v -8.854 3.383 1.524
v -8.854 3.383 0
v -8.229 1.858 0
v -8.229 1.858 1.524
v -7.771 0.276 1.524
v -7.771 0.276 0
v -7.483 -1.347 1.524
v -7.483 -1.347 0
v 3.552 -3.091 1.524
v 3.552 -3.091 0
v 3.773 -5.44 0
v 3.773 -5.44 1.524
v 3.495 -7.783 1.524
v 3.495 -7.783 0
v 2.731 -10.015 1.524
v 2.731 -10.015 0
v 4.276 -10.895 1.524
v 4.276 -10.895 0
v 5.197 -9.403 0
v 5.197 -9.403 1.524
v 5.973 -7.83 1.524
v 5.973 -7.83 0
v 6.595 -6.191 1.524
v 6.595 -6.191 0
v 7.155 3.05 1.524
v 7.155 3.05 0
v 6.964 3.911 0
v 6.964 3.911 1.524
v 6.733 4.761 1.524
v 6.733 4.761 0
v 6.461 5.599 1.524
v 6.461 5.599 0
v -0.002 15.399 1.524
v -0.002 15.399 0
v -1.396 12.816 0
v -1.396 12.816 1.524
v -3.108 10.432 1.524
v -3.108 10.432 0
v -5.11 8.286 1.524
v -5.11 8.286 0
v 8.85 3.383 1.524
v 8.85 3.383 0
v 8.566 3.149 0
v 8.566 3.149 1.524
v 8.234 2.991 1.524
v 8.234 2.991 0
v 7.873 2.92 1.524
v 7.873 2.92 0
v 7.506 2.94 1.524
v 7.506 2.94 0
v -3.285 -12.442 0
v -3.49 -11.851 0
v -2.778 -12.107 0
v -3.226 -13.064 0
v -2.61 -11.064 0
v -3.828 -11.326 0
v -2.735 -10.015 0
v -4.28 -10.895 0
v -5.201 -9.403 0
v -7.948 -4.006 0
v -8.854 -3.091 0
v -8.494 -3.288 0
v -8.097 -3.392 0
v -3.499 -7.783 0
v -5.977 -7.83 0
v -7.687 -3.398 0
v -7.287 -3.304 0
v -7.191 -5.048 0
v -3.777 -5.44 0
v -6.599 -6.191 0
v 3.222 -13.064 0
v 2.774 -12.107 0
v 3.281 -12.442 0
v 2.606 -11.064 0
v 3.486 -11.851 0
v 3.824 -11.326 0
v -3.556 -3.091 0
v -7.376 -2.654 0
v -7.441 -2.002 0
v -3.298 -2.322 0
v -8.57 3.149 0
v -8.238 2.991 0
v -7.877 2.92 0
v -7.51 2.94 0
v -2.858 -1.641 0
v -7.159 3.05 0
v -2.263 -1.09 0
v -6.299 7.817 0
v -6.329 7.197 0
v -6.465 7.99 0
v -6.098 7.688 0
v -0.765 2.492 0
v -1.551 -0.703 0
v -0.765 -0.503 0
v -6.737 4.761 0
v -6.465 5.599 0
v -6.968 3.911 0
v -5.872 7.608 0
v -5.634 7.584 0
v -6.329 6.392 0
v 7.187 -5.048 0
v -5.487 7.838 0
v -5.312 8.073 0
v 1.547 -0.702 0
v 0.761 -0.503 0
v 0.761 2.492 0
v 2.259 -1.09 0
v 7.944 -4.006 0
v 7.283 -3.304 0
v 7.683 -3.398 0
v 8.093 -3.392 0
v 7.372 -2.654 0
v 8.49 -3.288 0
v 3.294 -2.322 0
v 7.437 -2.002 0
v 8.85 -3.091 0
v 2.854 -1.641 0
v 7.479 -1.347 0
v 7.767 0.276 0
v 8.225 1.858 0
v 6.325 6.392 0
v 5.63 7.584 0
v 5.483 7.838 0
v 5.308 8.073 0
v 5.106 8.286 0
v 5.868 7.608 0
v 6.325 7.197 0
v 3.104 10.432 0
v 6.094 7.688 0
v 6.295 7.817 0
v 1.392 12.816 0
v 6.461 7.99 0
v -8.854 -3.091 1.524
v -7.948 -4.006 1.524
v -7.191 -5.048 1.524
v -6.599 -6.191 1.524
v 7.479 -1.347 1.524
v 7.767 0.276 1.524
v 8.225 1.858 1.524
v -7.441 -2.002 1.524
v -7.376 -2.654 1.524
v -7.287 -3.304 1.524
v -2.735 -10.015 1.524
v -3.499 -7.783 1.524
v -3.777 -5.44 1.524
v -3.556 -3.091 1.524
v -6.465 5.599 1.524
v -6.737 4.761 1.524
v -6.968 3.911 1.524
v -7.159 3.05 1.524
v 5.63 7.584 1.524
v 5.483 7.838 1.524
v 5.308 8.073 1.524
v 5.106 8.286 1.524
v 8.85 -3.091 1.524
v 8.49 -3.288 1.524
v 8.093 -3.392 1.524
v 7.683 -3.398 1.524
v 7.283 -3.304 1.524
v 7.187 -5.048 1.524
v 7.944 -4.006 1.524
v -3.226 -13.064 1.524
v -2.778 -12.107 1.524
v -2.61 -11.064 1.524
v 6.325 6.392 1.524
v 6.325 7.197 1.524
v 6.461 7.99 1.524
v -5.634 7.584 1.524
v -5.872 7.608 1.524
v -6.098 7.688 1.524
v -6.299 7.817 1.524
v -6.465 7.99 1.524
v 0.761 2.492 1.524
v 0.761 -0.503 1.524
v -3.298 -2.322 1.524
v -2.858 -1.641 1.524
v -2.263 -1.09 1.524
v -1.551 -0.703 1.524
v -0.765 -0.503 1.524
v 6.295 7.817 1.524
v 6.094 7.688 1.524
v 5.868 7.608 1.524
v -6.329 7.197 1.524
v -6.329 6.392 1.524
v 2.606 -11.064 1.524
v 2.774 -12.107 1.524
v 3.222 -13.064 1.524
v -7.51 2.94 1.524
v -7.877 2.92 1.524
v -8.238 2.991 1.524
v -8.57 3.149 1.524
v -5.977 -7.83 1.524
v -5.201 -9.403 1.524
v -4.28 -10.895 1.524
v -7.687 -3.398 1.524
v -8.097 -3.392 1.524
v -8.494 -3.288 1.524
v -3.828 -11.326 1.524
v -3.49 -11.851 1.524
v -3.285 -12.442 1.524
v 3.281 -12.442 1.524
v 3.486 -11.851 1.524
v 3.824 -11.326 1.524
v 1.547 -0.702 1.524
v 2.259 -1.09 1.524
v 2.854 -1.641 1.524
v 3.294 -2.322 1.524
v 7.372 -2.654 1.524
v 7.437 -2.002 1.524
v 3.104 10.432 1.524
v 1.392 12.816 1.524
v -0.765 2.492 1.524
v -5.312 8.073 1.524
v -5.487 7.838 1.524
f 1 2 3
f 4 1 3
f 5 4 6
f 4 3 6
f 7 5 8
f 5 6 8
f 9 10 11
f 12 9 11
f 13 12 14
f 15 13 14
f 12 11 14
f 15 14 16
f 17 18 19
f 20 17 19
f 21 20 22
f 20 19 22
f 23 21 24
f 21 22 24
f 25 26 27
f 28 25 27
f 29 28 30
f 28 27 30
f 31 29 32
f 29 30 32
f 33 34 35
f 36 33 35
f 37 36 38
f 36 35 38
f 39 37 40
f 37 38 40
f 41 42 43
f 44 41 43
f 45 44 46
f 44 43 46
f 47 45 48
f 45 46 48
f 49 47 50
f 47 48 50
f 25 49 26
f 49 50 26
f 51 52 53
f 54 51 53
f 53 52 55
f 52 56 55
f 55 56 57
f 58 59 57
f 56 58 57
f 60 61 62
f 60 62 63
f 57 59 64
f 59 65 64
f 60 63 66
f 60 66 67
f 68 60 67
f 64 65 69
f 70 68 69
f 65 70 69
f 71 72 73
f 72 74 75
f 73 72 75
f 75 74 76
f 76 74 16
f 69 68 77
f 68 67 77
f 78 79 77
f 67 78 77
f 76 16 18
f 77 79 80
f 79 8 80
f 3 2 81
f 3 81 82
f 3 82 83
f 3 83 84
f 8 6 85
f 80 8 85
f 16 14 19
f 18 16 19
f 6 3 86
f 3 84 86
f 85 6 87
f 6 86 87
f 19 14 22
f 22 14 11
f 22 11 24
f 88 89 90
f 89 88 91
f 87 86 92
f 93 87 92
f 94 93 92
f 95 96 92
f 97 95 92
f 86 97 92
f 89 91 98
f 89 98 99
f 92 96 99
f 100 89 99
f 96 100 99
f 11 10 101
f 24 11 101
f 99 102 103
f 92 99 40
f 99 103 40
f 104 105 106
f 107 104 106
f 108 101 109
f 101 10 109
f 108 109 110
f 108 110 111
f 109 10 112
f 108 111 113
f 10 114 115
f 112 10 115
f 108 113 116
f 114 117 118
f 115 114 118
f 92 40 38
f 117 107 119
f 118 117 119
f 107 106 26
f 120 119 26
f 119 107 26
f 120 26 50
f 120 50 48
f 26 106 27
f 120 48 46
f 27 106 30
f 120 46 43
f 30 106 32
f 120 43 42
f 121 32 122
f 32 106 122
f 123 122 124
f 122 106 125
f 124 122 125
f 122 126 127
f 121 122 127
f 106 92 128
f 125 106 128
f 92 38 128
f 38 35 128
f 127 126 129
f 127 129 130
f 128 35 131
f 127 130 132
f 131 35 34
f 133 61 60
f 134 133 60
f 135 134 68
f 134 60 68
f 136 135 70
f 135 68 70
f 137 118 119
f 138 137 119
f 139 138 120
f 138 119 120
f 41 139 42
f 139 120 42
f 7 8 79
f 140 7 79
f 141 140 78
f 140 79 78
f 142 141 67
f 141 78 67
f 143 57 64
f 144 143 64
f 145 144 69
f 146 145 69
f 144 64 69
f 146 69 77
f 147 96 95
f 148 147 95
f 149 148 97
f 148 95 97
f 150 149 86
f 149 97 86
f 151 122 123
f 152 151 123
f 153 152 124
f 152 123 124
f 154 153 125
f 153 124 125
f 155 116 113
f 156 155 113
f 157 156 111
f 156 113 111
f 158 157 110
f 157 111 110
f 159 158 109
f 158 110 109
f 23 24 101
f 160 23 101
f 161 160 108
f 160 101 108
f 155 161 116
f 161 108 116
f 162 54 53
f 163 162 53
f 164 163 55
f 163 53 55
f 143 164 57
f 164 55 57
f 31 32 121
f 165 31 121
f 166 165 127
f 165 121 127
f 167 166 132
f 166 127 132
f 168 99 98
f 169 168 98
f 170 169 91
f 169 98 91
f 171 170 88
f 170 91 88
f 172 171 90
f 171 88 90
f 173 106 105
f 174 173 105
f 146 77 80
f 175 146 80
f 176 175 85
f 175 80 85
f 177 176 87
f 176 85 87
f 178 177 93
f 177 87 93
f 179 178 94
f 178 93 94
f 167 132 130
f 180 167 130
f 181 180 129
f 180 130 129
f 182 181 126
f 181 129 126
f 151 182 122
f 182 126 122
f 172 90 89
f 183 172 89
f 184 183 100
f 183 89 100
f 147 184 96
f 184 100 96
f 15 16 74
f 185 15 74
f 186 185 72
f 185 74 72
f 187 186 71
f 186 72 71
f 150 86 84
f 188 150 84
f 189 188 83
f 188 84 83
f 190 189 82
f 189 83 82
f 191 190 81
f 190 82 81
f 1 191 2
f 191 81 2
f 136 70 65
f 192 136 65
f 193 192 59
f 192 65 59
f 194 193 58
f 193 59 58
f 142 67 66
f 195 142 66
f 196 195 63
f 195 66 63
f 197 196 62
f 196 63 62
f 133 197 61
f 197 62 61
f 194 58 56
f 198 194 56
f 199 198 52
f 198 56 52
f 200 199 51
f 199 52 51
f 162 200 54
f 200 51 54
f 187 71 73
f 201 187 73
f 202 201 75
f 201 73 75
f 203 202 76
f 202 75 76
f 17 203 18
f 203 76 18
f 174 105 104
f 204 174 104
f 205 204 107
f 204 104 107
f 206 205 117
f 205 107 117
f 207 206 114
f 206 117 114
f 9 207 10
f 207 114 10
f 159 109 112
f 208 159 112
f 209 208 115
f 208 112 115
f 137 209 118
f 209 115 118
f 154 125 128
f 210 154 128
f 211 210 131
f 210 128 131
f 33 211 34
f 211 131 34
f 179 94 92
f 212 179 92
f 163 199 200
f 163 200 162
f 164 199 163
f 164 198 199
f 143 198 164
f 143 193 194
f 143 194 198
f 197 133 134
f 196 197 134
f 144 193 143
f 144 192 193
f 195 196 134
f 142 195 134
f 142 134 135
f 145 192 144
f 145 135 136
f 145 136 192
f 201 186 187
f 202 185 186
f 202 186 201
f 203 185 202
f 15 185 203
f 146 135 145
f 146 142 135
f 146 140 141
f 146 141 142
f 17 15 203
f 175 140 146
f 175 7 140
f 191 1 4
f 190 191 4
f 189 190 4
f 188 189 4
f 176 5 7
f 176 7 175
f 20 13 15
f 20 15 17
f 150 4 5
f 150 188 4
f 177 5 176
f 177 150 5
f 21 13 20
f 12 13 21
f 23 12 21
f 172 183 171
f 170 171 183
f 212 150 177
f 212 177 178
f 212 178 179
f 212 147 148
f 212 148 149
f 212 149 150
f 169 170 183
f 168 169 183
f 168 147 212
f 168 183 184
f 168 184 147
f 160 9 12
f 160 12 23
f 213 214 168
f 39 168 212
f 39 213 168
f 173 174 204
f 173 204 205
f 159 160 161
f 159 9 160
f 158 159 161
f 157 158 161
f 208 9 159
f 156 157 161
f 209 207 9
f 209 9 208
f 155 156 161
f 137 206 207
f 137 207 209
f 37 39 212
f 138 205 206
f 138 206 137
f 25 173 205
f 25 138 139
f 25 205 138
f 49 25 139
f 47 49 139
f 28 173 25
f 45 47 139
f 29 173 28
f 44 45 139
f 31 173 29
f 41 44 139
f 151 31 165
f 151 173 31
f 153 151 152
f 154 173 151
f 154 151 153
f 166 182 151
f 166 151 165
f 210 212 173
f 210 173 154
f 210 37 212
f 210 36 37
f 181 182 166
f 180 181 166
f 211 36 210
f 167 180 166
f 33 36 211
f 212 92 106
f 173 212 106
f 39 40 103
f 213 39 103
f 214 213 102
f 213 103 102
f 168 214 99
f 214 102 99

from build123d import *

# Parameters (mm, degrees)
BOSS_EXTRUDE2_DEPTH = 1.524


with BuildPart() as part:
    # Sketch1 → Boss-Extrude2 (new body)
    with BuildSketch(Plane.XY):
        with BuildLine():
            Line((-0.765410013, -0.503143286), (-0.764991894, 2.492240818))
            Line((-0.764991894, 2.492240818), (0.760988125, 2.492240818))
            Line((0.760988125, 2.492240818), (0.760988125, -0.503092163))
            ThreePointArc((0.760988125, -0.503092163), (2.573737831, -1.346888202), (3.55195433, -3.090776309))
            ThreePointArc((3.55195433, -3.090776309), (3.695640119, -6.618686281), (2.730705837, -10.015110313))
            ThreePointArc((2.730705837, -10.015110313), (2.653965632, -11.591332876), (3.221955388, -13.063662413))
            ThreePointArc((3.221955388, -13.063662413), (3.485746852, -11.851447246), (4.275671769, -10.894854243))
            ThreePointArc((4.275671769, -10.894854243), (5.603621463, -8.626073328), (6.594544537, -6.191142388))
            ThreePointArc((6.594544537, -6.191142388), (7.545888132, -4.512710917), (8.849839361, -3.090776309))
            ThreePointArc((8.849839361, -3.090776309), (8.093123436, -3.392493185), (7.283276893, -3.30417195))
            ThreePointArc((7.283276893, -3.30417195), (7.407565604, -2.328155091), (7.47948144, -1.346888202))
            ThreePointArc((7.47948144, -1.346888202), (7.974772805, 1.073186615), (8.849839361, 3.383237301))
            ThreePointArc((8.849839361, 3.383237301), (8.055674116, 2.944556231), (7.154590571, 3.050329405))
            ThreePointArc((7.154590571, 3.050329405), (6.853539824, 4.337001735), (6.46088015, 5.598736896))
            ThreePointArc((6.46088015, 5.598736896), (6.307858777, 6.794433229), (6.46088015, 7.990129562))
            ThreePointArc((6.46088015, 7.990129562), (6.094168188, 7.687528271), (5.630106714, 7.584125409))
            ThreePointArc((5.630106714, 7.584125409), (5.398611626, 7.957700377), (5.106185913, 8.285778776))
            ThreePointArc((5.106185913, 8.285778776), (2.209855231, 11.5967516), (-0.002002475, 15.39924525))
            ThreePointArc((-0.002002475, 15.39924525), (-2.213860181, 11.5967516), (-5.110190864, 8.285778776))
            ThreePointArc((-5.110190864, 8.285778776), (-5.402616576, 7.957700377), (-5.634111665, 7.584125409))
            ThreePointArc((-5.634111665, 7.584125409), (-6.098173139, 7.687528271), (-6.4648851, 7.990129562))
            ThreePointArc((-6.4648851, 7.990129562), (-6.311863727, 6.794433229), (-6.4648851, 5.598736896))
            ThreePointArc((-6.4648851, 5.598736896), (-6.857544775, 4.337001735), (-7.158595522, 3.050329405))
            ThreePointArc((-7.158595522, 3.050329405), (-8.059679066, 2.944556231), (-8.853844312, 3.383237301))
            ThreePointArc((-8.853844312, 3.383237301), (-7.978777755, 1.073186615), (-7.48348639, -1.346888202))
            ThreePointArc((-7.48348639, -1.346888202), (-7.411570554, -2.328155091), (-7.287281843, -3.30417195))
            ThreePointArc((-7.287281843, -3.30417195), (-8.097128387, -3.392493185), (-8.853844312, -3.090776309))
            ThreePointArc((-8.853844312, -3.090776309), (-7.549893082, -4.512710917), (-6.598549488, -6.191142388))
            ThreePointArc((-6.598549488, -6.191142388), (-5.607626413, -8.626073328), (-4.27967672, -10.894854243))
            ThreePointArc((-4.27967672, -10.894854243), (-3.489751802, -11.851447246), (-3.225960338, -13.063662413))
            ThreePointArc((-3.225960338, -13.063662413), (-2.657970582, -11.591332876), (-2.734710788, -10.015110313))
            ThreePointArc((-2.734710788, -10.015110313), (-3.69964507, -6.618686281), (-3.555959281, -3.090776309))
            ThreePointArc((-3.555959281, -3.090776309), (-2.577896844, -1.347030777), (-0.765410013, -0.503143286))
        make_face()
    extrude(amount=BOSS_EXTRUDE2_DEPTH)


solid = part.part
